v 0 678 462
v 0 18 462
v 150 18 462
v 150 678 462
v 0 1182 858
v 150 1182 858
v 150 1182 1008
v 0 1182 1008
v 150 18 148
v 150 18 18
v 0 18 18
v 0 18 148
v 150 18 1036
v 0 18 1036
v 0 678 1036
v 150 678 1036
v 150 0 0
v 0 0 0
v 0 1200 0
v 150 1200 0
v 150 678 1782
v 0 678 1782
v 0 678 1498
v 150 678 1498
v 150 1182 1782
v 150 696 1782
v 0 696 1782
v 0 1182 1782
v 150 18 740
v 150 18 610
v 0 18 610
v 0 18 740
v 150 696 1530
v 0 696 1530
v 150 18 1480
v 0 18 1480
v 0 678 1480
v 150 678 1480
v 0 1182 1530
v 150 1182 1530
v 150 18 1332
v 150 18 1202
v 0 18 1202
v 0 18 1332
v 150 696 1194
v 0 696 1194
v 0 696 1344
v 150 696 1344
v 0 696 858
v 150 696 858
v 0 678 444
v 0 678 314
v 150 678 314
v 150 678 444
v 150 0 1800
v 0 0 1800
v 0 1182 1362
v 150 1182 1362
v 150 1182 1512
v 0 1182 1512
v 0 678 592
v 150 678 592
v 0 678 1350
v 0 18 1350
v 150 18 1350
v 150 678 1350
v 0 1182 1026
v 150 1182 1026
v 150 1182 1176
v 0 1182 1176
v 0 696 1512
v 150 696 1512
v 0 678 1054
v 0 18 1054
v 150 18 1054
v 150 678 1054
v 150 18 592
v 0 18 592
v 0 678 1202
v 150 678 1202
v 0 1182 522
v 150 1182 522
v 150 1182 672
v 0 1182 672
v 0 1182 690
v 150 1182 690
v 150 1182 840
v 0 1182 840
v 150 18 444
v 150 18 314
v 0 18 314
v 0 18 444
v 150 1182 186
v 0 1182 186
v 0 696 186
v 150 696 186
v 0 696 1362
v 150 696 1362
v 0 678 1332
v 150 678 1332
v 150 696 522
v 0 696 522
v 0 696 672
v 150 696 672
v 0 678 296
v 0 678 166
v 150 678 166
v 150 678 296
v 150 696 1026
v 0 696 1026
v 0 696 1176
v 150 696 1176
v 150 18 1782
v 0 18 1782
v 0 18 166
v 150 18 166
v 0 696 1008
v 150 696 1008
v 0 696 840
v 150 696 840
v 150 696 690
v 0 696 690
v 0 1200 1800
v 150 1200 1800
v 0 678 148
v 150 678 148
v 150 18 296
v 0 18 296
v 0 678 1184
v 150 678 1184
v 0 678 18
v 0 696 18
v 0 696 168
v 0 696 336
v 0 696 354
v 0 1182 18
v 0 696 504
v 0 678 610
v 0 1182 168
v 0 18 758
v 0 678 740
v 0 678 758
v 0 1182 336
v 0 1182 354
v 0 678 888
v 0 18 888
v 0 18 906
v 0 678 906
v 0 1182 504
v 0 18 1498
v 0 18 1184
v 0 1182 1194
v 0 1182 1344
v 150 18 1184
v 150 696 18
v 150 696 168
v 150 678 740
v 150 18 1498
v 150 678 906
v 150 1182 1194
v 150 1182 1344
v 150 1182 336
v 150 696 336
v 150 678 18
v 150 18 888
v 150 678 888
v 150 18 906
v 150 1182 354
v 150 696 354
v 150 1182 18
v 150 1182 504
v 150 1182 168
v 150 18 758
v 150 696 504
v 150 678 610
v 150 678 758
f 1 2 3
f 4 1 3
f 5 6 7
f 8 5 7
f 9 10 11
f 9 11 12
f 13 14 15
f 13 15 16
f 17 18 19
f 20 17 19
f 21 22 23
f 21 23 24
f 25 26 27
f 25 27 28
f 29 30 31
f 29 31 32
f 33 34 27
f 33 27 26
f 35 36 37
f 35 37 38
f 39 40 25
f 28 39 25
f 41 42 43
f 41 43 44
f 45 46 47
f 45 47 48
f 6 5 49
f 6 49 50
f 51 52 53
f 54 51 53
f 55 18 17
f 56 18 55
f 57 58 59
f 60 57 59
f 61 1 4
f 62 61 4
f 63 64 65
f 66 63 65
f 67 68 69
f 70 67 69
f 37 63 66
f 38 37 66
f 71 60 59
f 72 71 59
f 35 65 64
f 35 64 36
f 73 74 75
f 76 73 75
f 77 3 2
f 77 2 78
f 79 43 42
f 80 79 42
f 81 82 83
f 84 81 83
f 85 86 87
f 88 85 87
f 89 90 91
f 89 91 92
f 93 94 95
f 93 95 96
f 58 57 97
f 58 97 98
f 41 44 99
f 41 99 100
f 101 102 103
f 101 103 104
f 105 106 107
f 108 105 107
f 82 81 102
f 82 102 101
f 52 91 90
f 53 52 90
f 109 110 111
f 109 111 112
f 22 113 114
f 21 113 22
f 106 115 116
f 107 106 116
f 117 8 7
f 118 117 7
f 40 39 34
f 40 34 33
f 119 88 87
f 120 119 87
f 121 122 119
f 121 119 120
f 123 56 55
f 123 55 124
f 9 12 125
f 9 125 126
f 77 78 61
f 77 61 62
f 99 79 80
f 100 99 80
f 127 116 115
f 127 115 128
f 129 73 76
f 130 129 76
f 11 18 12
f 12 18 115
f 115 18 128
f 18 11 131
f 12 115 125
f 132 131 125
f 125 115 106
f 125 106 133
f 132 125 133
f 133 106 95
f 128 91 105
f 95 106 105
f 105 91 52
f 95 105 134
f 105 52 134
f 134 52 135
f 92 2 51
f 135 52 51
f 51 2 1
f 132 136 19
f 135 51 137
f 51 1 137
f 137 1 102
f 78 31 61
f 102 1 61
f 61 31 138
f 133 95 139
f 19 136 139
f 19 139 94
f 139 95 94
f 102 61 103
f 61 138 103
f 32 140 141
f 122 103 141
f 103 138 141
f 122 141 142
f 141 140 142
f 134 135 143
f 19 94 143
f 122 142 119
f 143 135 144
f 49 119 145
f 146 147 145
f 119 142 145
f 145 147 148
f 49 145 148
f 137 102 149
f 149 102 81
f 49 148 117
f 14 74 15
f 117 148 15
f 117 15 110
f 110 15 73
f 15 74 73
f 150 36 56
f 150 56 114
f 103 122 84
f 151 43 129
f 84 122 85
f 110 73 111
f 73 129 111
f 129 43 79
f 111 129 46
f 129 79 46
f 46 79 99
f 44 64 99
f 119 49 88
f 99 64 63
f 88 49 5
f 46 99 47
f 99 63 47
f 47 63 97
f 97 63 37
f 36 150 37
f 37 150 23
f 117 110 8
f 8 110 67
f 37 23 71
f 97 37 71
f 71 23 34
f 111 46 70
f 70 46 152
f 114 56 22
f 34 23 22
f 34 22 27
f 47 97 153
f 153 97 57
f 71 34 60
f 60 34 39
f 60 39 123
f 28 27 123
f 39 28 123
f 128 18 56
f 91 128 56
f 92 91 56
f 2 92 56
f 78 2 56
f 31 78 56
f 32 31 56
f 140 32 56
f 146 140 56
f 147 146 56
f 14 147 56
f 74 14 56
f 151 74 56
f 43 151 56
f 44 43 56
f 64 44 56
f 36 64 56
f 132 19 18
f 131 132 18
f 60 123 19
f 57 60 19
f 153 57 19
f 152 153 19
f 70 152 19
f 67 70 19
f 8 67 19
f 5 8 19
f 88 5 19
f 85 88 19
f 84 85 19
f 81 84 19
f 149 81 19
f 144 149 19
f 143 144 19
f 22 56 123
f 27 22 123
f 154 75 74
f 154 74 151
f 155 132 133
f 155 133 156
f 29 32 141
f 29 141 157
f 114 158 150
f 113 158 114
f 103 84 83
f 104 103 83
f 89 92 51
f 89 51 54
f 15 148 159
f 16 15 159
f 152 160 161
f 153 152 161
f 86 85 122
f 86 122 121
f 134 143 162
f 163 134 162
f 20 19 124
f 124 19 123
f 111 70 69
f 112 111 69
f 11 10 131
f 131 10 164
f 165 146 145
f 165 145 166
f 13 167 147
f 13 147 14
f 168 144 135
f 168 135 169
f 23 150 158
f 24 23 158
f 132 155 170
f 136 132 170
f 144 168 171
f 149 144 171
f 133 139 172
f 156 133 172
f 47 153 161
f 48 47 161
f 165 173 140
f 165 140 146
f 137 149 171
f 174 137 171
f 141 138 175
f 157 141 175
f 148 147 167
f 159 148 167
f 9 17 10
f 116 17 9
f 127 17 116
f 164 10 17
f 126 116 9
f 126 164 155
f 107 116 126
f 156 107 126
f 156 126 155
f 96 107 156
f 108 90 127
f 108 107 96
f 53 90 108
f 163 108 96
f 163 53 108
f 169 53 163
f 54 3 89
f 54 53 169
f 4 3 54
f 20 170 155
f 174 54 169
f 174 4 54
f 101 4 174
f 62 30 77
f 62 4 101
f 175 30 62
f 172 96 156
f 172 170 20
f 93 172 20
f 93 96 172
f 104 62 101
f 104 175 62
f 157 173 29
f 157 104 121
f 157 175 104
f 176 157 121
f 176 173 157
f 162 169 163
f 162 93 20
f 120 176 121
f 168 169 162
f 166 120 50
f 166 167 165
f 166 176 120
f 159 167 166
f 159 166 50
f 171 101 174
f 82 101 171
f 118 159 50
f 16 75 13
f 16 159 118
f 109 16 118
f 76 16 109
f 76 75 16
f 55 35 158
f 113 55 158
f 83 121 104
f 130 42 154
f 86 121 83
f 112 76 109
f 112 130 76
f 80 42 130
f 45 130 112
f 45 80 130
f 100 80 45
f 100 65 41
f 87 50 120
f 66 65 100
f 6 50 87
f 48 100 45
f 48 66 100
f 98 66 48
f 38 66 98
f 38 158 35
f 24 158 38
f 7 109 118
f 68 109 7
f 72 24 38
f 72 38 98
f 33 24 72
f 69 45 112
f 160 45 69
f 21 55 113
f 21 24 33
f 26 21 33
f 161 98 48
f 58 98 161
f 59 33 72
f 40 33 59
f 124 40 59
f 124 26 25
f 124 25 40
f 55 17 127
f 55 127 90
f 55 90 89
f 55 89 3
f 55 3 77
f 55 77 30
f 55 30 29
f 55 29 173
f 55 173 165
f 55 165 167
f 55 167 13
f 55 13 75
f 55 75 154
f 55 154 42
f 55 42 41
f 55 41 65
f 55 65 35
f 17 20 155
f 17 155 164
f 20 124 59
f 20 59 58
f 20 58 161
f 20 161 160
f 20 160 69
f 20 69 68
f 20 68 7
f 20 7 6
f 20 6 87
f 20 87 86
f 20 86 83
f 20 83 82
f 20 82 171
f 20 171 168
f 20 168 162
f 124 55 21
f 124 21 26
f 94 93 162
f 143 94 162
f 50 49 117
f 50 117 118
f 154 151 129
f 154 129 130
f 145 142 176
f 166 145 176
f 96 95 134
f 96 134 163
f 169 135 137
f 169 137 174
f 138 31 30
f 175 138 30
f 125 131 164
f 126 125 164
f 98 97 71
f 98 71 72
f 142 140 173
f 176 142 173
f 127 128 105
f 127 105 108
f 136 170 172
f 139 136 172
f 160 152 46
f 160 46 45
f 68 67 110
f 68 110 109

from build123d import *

# Parameters (mm, degrees)
F0_W     = 1200
F0_H     = 1800
F1_DEPTH = 150
F2_W     = 1164
F2_H     = 1764
F3_DEPTH = 150
F4_W     = 150
F4_H     = 18
F5_DEPTH = 1764
F6_W     = 150
F6_H     = 18
F7_DEPTH = 660
F8_W     = 150
F8_H     = 18
F9_DEPTH = 486


with BuildPart() as f1:
    # F0 (on Right) → F1 (new body)
    with BuildSketch(Plane.YZ):
        with Locations((600, 900)):
            Rectangle(F0_W, F0_H)
    extrude(amount=F1_DEPTH)

    # F2 (on face) → F3 (cut)
    with BuildSketch(Plane.YZ.offset(150)):
        with Locations((600, 900)):
            Rectangle(F2_W, F2_H)
    extrude(amount=-F3_DEPTH, mode=Mode.SUBTRACT)

    # F4 (on face) → F5 (join)
    with BuildSketch(Plane.XY.offset(18)):
        with Locations((75, 687)):
            Rectangle(F4_W, F4_H)
    extrude(amount=F5_DEPTH)

    # F6 (on face) → F7 (join)
    with BuildSketch(Plane.XZ.offset(-678)):
        with Locations((75, 157)):
            Rectangle(F6_W, F6_H)
        with Locations((75, 305)):
            Rectangle(F6_W, F6_H)
        with Locations((75, 453)):
            Rectangle(F6_W, F6_H)
        with Locations((75, 601)):
            Rectangle(F6_W, F6_H)
        with Locations((75, 749)):
            Rectangle(F6_W, F6_H)
        with Locations((75, 897)):
            Rectangle(F6_W, F6_H)
        with Locations((75, 1045)):
            Rectangle(F6_W, F6_H)
        with Locations((75, 1193)):
            Rectangle(F6_W, F6_H)
        with Locations((75, 1341)):
            Rectangle(F6_W, F6_H)
        with Locations((75, 1489)):
            Rectangle(F6_W, F6_H)
    extrude(amount=F7_DEPTH)

    # F8 (on face) → F9 (join)
    with BuildSketch(Plane.XZ.offset(-1182)):
        with Locations((75, 177)):
            Rectangle(F8_W, F8_H)
        with Locations((75, 345)):
            Rectangle(F8_W, F8_H)
        with Locations((75, 513)):
            Rectangle(F8_W, F8_H)
        with Locations((75, 681)):
            Rectangle(F8_W, F8_H)
        with Locations((75, 849)):
            Rectangle(F8_W, F8_H)
        with Locations((75, 1017)):
            Rectangle(F8_W, F8_H)
        with Locations((75, 1185)):
            Rectangle(F8_W, F8_H)
        with Locations((75, 1353)):
            Rectangle(F8_W, F8_H)
        with Locations((75, 1521)):
            Rectangle(F8_W, F8_H)
    extrude(amount=F9_DEPTH)


solid = f1.part
